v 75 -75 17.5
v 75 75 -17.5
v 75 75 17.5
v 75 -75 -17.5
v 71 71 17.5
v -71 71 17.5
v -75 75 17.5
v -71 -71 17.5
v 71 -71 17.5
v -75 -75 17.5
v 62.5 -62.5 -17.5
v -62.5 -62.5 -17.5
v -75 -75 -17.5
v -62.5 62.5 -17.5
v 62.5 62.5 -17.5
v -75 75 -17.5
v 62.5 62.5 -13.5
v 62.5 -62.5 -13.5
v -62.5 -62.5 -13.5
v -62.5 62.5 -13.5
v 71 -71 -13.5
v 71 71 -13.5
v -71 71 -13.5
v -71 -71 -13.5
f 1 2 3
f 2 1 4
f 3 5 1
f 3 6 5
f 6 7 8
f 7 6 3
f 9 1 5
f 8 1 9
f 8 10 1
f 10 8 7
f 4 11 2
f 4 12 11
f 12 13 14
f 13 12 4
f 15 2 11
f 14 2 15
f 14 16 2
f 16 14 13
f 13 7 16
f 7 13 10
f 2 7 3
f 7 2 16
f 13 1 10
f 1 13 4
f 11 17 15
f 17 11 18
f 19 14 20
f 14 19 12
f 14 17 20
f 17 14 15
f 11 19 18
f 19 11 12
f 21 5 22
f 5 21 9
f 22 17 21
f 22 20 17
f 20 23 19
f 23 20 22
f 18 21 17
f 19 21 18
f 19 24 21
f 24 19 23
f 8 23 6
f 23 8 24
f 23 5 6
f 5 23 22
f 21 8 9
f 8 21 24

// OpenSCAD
$fn = $preview ? 50 : 170;

HEIGHT = 35;
PLEXIGLASS_WIDTH = 3;

difference() {
    cube([150, 150, HEIGHT], center = true);
    translate([0,0,-5])
        cube([125, 125, HEIGHT+5], center = true); 
     translate([0,0,4])
        cube([142, 142, HEIGHT], center = true);   
}

//cube([132, 132, 4], center=true);
//
//intersection() {
//translate([-3,0,2])
//rotate([0,90,0])
//    difference() {
//    cylinder(h=6, r=8);  
//    }
//translate([0,0,5])
//cube([50,50,12], center=true);
//}
